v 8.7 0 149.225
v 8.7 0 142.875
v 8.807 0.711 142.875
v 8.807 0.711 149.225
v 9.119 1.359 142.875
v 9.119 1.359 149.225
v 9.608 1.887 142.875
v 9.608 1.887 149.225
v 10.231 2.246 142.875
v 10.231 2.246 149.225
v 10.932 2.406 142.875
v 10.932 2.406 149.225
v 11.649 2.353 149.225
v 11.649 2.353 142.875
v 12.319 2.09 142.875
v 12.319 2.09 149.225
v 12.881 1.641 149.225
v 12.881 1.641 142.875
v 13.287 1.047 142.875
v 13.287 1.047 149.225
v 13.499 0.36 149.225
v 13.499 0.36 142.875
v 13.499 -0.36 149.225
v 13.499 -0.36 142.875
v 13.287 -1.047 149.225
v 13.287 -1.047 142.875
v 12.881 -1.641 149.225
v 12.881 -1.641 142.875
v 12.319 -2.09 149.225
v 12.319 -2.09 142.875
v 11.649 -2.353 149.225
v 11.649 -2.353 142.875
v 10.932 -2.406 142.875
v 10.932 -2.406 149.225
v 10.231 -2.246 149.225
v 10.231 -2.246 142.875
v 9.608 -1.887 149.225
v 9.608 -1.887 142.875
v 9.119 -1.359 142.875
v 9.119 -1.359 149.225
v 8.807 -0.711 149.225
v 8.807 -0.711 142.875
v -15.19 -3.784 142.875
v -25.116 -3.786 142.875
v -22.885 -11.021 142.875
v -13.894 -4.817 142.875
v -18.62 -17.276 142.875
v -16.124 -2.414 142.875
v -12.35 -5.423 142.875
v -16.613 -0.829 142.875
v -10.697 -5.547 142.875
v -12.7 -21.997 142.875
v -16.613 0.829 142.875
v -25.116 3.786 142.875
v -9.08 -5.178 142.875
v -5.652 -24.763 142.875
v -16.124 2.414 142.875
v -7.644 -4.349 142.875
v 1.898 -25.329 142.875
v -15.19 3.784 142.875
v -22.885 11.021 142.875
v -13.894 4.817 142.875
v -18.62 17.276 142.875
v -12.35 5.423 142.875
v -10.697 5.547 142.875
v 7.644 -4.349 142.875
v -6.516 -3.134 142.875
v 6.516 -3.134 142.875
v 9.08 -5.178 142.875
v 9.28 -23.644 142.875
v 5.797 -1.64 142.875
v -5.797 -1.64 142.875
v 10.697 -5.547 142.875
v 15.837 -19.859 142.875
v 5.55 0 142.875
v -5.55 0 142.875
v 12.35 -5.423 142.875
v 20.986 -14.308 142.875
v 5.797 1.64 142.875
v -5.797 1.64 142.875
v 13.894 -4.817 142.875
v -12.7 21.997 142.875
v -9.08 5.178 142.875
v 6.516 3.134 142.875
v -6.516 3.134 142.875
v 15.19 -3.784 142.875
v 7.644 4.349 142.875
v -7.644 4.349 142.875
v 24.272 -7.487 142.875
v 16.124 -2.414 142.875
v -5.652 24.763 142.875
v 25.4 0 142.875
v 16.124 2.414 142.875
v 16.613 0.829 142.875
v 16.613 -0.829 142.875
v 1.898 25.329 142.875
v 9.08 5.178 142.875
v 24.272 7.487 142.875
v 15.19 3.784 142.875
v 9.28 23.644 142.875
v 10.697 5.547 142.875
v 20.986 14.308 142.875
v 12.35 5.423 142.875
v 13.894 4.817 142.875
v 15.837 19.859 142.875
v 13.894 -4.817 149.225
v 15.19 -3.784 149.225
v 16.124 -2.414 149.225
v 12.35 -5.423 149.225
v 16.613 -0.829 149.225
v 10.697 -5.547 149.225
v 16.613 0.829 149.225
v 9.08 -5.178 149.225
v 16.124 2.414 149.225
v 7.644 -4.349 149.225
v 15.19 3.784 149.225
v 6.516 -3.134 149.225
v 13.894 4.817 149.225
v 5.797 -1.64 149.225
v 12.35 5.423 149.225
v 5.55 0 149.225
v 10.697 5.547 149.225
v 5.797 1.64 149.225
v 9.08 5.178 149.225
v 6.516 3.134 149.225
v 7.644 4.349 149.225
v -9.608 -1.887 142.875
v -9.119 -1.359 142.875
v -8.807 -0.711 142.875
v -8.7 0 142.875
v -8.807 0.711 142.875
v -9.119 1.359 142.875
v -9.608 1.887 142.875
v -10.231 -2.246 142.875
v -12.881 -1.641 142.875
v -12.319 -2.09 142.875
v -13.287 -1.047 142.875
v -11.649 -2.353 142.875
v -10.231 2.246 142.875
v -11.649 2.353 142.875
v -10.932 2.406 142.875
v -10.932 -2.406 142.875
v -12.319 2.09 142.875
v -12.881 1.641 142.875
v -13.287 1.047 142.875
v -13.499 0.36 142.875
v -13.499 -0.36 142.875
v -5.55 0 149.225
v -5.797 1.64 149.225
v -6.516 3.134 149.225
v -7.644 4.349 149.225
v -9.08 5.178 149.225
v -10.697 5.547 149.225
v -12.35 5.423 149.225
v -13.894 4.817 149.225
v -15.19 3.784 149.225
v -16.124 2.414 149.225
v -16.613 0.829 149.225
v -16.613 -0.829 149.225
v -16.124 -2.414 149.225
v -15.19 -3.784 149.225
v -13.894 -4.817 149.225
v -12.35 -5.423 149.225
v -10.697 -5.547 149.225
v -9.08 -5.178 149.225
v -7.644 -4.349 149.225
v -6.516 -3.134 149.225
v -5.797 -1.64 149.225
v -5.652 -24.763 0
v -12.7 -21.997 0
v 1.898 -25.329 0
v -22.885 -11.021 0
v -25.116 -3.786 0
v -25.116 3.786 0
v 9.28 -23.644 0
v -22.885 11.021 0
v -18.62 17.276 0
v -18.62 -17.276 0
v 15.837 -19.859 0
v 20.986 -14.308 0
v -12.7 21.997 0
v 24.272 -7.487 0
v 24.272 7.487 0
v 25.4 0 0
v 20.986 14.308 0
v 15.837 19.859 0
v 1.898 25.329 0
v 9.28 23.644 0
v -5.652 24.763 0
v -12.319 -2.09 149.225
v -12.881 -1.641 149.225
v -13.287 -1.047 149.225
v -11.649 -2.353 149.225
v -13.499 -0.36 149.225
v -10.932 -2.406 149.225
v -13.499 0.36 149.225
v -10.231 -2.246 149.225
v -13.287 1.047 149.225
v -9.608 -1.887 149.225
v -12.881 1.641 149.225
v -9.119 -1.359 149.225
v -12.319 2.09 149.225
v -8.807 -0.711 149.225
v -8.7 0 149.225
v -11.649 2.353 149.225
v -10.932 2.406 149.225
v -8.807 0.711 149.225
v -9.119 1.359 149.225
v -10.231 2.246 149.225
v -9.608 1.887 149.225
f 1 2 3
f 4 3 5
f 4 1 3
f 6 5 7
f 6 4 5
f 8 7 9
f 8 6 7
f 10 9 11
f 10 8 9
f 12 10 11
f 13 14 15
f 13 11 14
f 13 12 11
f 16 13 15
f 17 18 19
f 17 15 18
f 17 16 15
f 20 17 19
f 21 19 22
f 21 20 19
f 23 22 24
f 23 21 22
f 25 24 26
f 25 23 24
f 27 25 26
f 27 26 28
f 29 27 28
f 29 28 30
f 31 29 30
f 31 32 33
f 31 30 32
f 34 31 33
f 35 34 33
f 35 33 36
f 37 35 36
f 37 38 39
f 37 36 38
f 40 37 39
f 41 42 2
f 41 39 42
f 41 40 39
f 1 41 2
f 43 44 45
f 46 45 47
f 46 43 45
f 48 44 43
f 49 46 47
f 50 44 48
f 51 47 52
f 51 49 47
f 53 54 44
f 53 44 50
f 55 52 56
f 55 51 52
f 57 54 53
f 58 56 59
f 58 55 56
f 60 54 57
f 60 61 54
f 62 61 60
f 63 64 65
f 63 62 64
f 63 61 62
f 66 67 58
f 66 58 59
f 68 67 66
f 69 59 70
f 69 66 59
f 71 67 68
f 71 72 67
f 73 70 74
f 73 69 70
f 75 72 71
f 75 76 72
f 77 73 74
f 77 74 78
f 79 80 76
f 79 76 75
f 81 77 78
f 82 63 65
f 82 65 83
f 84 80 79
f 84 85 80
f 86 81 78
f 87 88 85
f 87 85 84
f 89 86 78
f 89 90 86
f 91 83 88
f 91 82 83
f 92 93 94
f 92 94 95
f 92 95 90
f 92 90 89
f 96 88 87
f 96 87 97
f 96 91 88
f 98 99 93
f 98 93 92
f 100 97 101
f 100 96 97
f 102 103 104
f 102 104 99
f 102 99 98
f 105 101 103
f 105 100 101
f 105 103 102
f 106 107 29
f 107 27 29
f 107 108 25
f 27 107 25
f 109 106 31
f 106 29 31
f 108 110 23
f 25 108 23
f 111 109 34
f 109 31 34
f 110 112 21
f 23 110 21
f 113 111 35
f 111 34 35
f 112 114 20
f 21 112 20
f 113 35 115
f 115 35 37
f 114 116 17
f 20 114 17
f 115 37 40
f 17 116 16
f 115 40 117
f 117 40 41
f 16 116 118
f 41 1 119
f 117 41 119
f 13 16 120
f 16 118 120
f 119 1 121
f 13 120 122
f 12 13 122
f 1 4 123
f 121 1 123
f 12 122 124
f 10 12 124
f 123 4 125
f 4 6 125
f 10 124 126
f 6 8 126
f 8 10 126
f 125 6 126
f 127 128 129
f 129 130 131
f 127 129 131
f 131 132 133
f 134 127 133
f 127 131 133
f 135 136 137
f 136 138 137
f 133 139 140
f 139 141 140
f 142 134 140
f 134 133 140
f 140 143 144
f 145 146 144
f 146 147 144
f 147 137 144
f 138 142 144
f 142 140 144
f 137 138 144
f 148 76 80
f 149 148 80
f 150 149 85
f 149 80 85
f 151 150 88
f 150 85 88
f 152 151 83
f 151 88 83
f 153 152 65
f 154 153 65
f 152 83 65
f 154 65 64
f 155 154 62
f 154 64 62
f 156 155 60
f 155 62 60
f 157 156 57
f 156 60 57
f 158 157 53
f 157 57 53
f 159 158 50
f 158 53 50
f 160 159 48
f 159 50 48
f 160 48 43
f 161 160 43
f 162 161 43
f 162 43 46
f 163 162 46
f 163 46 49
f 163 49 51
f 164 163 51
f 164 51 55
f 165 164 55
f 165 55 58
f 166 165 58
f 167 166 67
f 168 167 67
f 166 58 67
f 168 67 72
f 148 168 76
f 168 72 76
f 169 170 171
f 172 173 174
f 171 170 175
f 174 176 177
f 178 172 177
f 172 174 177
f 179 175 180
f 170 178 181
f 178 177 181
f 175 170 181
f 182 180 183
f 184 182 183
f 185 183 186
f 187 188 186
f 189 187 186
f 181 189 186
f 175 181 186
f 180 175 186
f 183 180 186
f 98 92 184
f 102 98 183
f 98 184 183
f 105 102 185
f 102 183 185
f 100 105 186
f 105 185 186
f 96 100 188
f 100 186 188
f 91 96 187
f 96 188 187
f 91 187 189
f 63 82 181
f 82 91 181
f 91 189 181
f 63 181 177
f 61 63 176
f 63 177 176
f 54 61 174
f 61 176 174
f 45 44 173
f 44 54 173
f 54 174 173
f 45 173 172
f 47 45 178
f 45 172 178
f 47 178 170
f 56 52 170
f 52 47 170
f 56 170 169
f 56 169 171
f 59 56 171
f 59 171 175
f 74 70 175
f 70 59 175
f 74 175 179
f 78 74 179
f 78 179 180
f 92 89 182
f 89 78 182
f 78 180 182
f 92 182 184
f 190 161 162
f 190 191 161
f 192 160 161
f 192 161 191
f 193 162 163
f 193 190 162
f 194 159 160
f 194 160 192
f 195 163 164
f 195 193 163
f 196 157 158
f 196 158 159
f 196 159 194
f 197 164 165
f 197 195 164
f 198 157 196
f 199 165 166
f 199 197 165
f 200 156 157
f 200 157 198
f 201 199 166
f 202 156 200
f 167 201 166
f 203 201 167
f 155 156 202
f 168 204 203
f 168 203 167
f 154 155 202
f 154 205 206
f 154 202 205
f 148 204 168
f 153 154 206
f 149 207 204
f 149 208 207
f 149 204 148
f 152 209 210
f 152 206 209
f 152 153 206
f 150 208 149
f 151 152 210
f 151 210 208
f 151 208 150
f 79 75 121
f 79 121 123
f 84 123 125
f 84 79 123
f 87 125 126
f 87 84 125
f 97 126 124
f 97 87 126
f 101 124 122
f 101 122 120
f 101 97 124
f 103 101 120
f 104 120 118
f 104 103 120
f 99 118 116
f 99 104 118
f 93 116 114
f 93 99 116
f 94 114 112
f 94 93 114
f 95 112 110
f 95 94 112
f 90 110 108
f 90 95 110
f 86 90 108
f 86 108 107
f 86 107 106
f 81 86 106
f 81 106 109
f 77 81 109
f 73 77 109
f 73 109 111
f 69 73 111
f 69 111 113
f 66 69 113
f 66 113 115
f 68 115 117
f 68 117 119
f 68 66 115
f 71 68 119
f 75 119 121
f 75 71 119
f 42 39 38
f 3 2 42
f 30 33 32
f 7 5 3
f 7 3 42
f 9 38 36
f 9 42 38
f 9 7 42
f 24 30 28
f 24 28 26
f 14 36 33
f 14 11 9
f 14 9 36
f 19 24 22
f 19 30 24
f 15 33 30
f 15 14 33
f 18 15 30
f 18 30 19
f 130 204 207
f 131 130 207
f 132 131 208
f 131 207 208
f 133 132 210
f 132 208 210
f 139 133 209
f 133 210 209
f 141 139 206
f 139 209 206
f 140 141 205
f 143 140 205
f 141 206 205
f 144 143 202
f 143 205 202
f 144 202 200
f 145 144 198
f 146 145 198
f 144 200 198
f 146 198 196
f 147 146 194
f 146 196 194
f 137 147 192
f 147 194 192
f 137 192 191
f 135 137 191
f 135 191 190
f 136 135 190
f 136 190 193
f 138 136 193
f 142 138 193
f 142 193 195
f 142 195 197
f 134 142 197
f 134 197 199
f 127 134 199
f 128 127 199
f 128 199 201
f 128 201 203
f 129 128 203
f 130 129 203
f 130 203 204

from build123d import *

# Parameters (mm, degrees)
F0_R     = 25.4
F1_DEPTH = 142.875
F2_R     = 5.5626
F3_DEPTH = 6.35
F4_R     = 2.413
F5_DEPTH = 9.525


with BuildPart() as f1:
    # F0 (on Top) → F1 (new body)
    with BuildSketch(Plane.XY):
        Circle(F0_R)
    extrude(amount=F1_DEPTH)

    # F2 (on face) → F3 (join)
    with BuildSketch(Plane.XY.offset(142.875)):
        with Locations((-11.1125, 0)):
            Circle(F2_R)
    extrude(amount=F3_DEPTH)

    # F4 (on face) → F5 (cut)
    with BuildSketch(Plane.XY.offset(149.225)):
        with Locations((-11.1125, 0)):
            Circle(F4_R)
    extrude(amount=-F5_DEPTH, mode=Mode.SUBTRACT)

    # F6: F1 across plane


with BuildPart() as f1_1:
    add(f1.part)
    add(f1.part.mirror(Plane.YZ))


solid = f1_1.part
